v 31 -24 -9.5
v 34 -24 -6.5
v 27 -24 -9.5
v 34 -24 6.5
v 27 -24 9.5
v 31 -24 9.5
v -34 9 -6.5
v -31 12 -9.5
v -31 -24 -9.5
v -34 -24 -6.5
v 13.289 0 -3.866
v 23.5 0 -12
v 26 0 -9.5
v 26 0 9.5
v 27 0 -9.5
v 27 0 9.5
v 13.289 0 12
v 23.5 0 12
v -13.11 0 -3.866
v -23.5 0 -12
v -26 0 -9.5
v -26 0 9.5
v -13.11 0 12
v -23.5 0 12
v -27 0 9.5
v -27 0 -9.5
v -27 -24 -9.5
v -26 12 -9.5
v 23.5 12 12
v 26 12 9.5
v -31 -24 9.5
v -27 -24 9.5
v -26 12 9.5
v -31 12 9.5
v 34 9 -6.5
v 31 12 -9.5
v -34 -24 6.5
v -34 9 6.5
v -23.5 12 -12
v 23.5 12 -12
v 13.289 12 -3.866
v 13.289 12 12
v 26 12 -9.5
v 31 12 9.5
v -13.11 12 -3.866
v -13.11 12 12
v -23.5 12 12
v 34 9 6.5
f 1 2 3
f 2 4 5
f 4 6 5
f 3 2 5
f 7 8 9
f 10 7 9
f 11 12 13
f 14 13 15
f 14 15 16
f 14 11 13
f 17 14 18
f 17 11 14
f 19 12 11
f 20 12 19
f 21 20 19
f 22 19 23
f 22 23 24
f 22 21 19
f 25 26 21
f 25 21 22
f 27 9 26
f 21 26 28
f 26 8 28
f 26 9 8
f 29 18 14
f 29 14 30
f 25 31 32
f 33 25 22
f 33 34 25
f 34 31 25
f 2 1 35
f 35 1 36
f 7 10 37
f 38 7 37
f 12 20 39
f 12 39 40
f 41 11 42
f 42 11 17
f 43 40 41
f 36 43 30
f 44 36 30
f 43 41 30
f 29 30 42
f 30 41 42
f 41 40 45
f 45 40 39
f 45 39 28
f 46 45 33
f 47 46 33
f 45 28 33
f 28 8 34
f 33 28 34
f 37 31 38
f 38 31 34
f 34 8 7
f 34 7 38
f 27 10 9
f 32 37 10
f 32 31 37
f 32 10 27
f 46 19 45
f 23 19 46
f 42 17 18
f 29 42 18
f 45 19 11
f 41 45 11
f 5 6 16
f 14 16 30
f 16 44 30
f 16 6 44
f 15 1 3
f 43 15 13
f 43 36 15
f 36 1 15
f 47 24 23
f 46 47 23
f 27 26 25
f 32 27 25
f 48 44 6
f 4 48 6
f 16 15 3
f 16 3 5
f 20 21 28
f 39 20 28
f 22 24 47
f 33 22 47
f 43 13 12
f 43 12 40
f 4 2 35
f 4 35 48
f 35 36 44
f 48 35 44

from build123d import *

# Parameters (mm, degrees)
SKETCH1_W                = 52
SKETCH1_H                = 24
SKETCH1_R                = 8.25
BOSS_EXTRUDE1_DEPTH      = 12
SKETCH2_R                = 1
CUT_EXTRUDE1_DEPTH       = 32.048349393
SKETCH3_R                = 1.75
CUT_EXTRUDE2_DEPTH       = 1
CUT_EXTRUDE3_DEPTH       = 5
FILLET3_R                = 0.5
CHAMFER1_SIZE            = 2.5
SKETCH5_W                = 19
SKETCH5_H                = 12
BOSS_EXTRUDE2_DEPTH      = 8
SKETCH6_W                = 7
SKETCH6_H                = 19
BOSS_EXTRUDE3_DEPTH      = 24
CHAMFER2_SIZE            = 3
CHAMFER2_OF_MIRROR1_SIZE = 3
SKETCH7_W                = 14
SKETCH7_H                = 8
CUT_EXTRUDE4_DEPTH       = 5
FILLET4_R                = 0.5
BOSS_EXTRUDE4_DEPTH      = 12
SKETCH9_W                = 26.398994769
SKETCH9_H                = 16
CUT_EXTRUDE5_DEPTH       = 13


with BuildPart() as part:
    # Sketch1 → Boss-Extrude1 (new body)
    with BuildSketch(Plane(origin=(0, 0, 0), x_dir=(1, 0, 0), z_dir=(0, 1, 0))):
        Rectangle(SKETCH1_W, SKETCH1_H)
        with Locations(Location((12.75, 0, 0), (0, 0, 270))):
            Circle(SKETCH1_R, mode=Mode.SUBTRACT)
        with Locations(Location((-12.75, 0, 0), (0, 0, 270))):
            Circle(SKETCH1_R, mode=Mode.SUBTRACT)
    extrude(amount=BOSS_EXTRUDE1_DEPTH)

    # Sketch2 → Cut-Extrude1 (cut, through all)
    with BuildSketch(Plane(origin=(0, 12, 0), x_dir=(1, 0, 0), z_dir=(0, 1, 0))):
        with Locations(Location((-21.35, 8.85, 0), (0, 0, 270))):
            Circle(SKETCH2_R)
        with Locations(Location((21.35, 8.85, 0), (0, 0, 270))):
            Circle(SKETCH2_R)
        with Locations(Location((21.35, -8.85, 0), (0, 0, 270))):
            Circle(SKETCH2_R)
        with Locations(Location((-21.35, -8.85, 0), (0, 0, 270))):
            Circle(SKETCH2_R)
    extrude(amount=-CUT_EXTRUDE1_DEPTH, mode=Mode.SUBTRACT)

    # Sketch3 → Cut-Extrude2 (cut)
    with BuildSketch(Plane(origin=(0, 12, 0), x_dir=(1, 0, 0), z_dir=(0, 1, 0))):
        with Locations(Location((-21.35, 8.85, 0), (0, 0, 270))):
            Circle(SKETCH3_R)
        with Locations(Location((21.35, 8.85, 0), (0, 0, 270))):
            Circle(SKETCH3_R)
        with Locations(Location((21.35, -8.85, 0), (0, 0, 270))):
            Circle(SKETCH3_R)
        with Locations(Location((-21.35, -8.85, 0), (0, 0, 270))):
            Circle(SKETCH3_R)
    extrude(amount=-CUT_EXTRUDE2_DEPTH, mode=Mode.SUBTRACT)

    # Sketch4 → Cut-Extrude3 (cut)
    with BuildSketch(Plane.XZ):
        Polygon((-6, -5), (-6, -12), (6, -12), (6, -5), (0, -5), align=None)
    extrude(amount=-CUT_EXTRUDE3_DEPTH, mode=Mode.SUBTRACT)

    # Fillet3
    fillet3_edges = [part.edges().sort_by_distance(p)[0] for p in [
        (-6, 2.5, -5),
        (6, 5, -8.5),
        (6, 2.5, -5),
        (-6, 5, -8.5),
        (0, 5, -5),
    ]]
    fillet(fillet3_edges, radius=FILLET3_R)

    # Chamfer1
    chamfer1_edges = [part.edges().sort_by_distance(p)[0] for p in [
        (26, 6, 12),
        (-26, 6, 12),
        (-26, 6, -12),
        (26, 6, -12),
    ]]
    chamfer(chamfer1_edges, length=CHAMFER1_SIZE)

    # Sketch5 → Boss-Extrude2 (add)
    with BuildSketch(Plane.ZY.offset(26)):
        with Locations((0, 6)):
            Rectangle(SKETCH5_W, SKETCH5_H)
    boss_extrude2 = extrude(amount=BOSS_EXTRUDE2_DEPTH)

    # Sketch6 → Boss-Extrude3 (add)
    with BuildSketch(Plane.XZ):
        with Locations((-30.5, 0)):
            Rectangle(SKETCH6_W, SKETCH6_H)
    boss_extrude3 = extrude(amount=BOSS_EXTRUDE3_DEPTH)

    # Chamfer2
    chamfer2_edges = [part.edges().sort_by_distance(p)[0] for p in [
        (-34, -6, 9.5),
        (-34, 12, 0),
        (-34, -6, -9.5),
    ]]
    chamfer(chamfer2_edges, length=CHAMFER2_SIZE)

    # Mirror1: Boss-Extrude2, Boss-Extrude3 across plane
    add(boss_extrude2.mirror(Plane(origin=(0, 0, 0), x_dir=(0, 0, 1), z_dir=(1, 0, 0))))
    add(boss_extrude3.mirror(Plane(origin=(0, 0, 0), x_dir=(0, 0, 1), z_dir=(1, 0, 0))))

    # Chamfer2 of Mirror1
    chamfer2_of_mirror1_edges = [part.edges().sort_by_distance(p)[0] for p in [
        (34, -6, 9.5),
        (34, 12, 0),
        (34, -6, -9.5),
    ]]
    chamfer(chamfer2_of_mirror1_edges, length=CHAMFER2_OF_MIRROR1_SIZE)

    # Sketch7 → Cut-Extrude4 (cut)
    with BuildSketch(Plane.XZ):
        with Locations((0, 12)):
            Rectangle(SKETCH7_W, SKETCH7_H)
    extrude(amount=-CUT_EXTRUDE4_DEPTH, mode=Mode.SUBTRACT)

    # Fillet4
    fillet4_edges = [part.edges().sort_by_distance(p)[0] for p in [
        (-7, 2.5, 8),
        (7, 5, 10),
        (0, 5, 8),
        (-7, 5, 10),
        (7, 2.5, 8),
    ]]
    fillet(fillet4_edges, radius=FILLET4_R)

    # Sketch8 → Boss-Extrude4 (add)
    with BuildSketch(Plane.XZ):
        Polygon((-7, 12), (7, 12), (23.5, 12), (26, 9.5), (27, 9.5), (27, -9.5), (26, -9.5), (23.5, -12), (6, -12), (-6, -12), (-23.5, -12), (-26, -9.5), (-27, -9.5), (-27, 9.5), (-26, 9.5), (-23.5, 12), align=None)
    extrude(amount=-BOSS_EXTRUDE4_DEPTH)

    # Sketch9 → Cut-Extrude5 (cut)
    with BuildSketch(Plane.XZ):
        with Locations((0.089665153, 4.133644411)):
            Rectangle(SKETCH9_W, SKETCH9_H)
    extrude(amount=-CUT_EXTRUDE5_DEPTH, mode=Mode.SUBTRACT)


solid = part.part
